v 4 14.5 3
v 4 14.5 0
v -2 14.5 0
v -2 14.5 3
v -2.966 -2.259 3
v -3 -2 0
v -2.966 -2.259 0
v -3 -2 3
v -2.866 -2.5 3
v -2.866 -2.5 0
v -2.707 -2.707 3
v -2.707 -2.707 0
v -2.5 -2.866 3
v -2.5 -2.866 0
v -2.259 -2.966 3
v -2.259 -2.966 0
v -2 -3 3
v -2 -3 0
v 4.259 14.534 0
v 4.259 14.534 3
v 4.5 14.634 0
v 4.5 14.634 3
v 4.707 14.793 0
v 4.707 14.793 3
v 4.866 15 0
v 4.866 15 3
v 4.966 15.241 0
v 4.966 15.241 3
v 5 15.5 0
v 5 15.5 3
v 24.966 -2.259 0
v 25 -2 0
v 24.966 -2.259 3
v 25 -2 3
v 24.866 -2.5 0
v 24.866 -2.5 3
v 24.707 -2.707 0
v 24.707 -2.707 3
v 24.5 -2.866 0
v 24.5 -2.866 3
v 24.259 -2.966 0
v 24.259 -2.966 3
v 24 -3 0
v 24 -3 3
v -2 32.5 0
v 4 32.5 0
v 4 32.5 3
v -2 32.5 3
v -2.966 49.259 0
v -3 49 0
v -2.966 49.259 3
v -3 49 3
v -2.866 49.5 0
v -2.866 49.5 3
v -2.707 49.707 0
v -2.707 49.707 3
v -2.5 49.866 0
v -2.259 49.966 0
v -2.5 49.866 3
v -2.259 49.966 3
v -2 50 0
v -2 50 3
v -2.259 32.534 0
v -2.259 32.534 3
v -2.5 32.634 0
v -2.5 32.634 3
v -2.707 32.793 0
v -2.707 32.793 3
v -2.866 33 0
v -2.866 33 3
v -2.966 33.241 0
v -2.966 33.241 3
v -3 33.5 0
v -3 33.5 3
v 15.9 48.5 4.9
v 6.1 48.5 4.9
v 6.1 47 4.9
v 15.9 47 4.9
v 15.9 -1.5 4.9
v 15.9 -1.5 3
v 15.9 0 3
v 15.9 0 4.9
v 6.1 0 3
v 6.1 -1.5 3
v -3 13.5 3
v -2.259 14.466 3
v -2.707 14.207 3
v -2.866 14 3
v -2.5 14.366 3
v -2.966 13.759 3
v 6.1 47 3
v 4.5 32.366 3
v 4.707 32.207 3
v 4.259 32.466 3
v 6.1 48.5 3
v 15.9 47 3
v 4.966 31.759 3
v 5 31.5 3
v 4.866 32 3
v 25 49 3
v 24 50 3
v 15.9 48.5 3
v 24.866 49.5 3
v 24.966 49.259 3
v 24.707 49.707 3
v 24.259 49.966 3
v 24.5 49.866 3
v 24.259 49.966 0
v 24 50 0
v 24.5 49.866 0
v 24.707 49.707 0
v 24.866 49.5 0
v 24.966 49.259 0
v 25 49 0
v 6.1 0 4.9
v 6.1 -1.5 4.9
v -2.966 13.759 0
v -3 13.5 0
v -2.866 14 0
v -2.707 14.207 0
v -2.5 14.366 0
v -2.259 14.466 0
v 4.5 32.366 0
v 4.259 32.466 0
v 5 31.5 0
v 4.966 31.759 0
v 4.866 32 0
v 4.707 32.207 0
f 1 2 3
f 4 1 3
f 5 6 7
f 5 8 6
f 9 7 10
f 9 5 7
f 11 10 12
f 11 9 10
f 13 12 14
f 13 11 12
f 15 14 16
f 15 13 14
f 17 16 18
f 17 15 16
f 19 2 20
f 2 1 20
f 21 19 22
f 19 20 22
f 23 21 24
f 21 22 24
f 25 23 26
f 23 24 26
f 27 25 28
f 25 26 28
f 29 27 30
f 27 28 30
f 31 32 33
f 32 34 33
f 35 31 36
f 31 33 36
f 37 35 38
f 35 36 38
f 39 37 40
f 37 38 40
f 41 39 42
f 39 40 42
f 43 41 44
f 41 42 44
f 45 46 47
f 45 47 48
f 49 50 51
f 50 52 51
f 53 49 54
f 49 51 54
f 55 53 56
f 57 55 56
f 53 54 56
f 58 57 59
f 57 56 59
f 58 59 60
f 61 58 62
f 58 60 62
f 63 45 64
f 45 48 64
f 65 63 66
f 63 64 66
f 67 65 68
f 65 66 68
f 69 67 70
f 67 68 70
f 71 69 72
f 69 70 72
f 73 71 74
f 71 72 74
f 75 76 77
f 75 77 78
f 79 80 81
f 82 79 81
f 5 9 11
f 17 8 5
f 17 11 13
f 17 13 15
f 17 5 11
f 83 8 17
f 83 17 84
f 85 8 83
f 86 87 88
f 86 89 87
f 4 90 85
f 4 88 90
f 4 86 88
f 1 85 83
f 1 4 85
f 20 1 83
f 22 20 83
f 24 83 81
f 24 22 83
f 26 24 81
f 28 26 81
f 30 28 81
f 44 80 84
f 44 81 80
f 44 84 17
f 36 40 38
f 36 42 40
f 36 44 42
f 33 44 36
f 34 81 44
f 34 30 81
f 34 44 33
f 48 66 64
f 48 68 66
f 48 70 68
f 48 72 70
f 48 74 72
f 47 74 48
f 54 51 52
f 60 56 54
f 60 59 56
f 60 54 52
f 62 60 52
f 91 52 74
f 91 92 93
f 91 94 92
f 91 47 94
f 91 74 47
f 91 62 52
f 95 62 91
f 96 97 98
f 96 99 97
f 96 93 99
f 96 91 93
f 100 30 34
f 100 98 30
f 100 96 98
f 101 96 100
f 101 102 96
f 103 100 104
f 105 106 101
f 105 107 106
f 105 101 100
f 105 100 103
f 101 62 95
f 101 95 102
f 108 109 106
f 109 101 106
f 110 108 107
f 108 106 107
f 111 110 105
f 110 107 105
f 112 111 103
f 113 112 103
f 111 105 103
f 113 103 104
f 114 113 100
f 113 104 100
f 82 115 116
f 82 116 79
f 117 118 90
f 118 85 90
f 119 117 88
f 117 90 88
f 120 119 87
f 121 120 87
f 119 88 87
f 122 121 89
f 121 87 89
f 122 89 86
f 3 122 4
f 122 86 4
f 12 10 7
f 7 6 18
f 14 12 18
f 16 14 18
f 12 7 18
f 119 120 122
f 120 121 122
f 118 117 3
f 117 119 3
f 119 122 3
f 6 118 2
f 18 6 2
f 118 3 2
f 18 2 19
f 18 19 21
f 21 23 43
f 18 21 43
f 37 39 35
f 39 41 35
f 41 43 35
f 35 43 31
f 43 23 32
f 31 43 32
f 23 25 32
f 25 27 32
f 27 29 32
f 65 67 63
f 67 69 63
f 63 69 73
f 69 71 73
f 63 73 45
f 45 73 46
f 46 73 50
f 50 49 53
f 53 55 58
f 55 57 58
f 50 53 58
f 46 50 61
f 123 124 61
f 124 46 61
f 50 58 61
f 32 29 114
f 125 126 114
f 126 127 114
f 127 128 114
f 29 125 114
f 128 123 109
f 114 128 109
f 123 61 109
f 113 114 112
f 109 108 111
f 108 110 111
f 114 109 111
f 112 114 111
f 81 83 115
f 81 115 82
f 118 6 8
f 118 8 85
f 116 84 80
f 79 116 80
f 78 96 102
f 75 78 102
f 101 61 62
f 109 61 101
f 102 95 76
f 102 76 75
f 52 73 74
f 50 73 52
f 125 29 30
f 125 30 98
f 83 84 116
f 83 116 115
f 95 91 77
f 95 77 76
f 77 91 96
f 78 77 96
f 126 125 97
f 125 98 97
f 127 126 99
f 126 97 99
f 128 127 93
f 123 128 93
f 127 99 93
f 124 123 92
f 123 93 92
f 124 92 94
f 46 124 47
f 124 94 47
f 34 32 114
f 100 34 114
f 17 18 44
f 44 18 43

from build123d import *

# Parameters (mm, degrees)
SKETCH1_W           = 28
SKETCH1_H           = 53
SKETCH1_W_2         = 22
SKETCH1_H_2         = 47
BOSS_EXTRUDE1_DEPTH = 3
SKETCH3_W           = 9.8
SKETCH3_H           = 1.5
BOSS_EXTRUDE2_DEPTH = 1.9
SKETCH4_W           = 16
SKETCH4_H           = 18
CUT_EXTRUDE1_DEPTH  = 57.116040488
FILLET1_R           = 1


with BuildPart() as part:
    # Sketch1 → Boss-Extrude1 (new body)
    # profile 1 of 2: a face of its own
    with BuildSketch(Plane.XY):
        with Locations((11, 23.5)):
            Rectangle(SKETCH1_W, SKETCH1_H)
        with Locations((11, 23.5)):
            Rectangle(SKETCH1_W_2, SKETCH1_H_2, mode=Mode.SUBTRACT)
    # profile 2 of 2: a face of its own
    with BuildSketch(Plane.XY):
        with Locations((11, 23.5)):
            Rectangle(SKETCH1_W_2, SKETCH1_H_2)
    extrude(amount=BOSS_EXTRUDE1_DEPTH)

    # Sketch3 → Boss-Extrude2 (add)
    with BuildSketch(Plane.XY.offset(3)):
        with Locations((11, 47.75)):
            Rectangle(SKETCH3_W, SKETCH3_H)
        with Locations((11, -0.75)):
            Rectangle(SKETCH3_W, SKETCH3_H)
    extrude(amount=BOSS_EXTRUDE2_DEPTH)

    # Sketch4 → Cut-Extrude1 (cut, through all)
    with BuildSketch(Plane(origin=(0, 0, 0), x_dir=(-1, 0, 0), z_dir=(0, 0, -1))):
        with Locations((3, 23.5)):
            Rectangle(SKETCH4_W, SKETCH4_H)
    extrude(amount=-CUT_EXTRUDE1_DEPTH, mode=Mode.SUBTRACT)

    # Fillet1
    fillet1_edges = [part.edges().sort_by_distance(p)[0] for p in [
        (-3, 14.5, 1.5),
        (-3, 32.5, 1.5),
        (5, 14.5, 1.5),
        (5, 32.5, 1.5),
        (-3, -3, 1.5),
        (-3, 50, 1.5),
        (25, 50, 1.5),
        (25, -3, 1.5),
    ]]
    fillet(fillet1_edges, radius=FILLET1_R)


solid = part.part
